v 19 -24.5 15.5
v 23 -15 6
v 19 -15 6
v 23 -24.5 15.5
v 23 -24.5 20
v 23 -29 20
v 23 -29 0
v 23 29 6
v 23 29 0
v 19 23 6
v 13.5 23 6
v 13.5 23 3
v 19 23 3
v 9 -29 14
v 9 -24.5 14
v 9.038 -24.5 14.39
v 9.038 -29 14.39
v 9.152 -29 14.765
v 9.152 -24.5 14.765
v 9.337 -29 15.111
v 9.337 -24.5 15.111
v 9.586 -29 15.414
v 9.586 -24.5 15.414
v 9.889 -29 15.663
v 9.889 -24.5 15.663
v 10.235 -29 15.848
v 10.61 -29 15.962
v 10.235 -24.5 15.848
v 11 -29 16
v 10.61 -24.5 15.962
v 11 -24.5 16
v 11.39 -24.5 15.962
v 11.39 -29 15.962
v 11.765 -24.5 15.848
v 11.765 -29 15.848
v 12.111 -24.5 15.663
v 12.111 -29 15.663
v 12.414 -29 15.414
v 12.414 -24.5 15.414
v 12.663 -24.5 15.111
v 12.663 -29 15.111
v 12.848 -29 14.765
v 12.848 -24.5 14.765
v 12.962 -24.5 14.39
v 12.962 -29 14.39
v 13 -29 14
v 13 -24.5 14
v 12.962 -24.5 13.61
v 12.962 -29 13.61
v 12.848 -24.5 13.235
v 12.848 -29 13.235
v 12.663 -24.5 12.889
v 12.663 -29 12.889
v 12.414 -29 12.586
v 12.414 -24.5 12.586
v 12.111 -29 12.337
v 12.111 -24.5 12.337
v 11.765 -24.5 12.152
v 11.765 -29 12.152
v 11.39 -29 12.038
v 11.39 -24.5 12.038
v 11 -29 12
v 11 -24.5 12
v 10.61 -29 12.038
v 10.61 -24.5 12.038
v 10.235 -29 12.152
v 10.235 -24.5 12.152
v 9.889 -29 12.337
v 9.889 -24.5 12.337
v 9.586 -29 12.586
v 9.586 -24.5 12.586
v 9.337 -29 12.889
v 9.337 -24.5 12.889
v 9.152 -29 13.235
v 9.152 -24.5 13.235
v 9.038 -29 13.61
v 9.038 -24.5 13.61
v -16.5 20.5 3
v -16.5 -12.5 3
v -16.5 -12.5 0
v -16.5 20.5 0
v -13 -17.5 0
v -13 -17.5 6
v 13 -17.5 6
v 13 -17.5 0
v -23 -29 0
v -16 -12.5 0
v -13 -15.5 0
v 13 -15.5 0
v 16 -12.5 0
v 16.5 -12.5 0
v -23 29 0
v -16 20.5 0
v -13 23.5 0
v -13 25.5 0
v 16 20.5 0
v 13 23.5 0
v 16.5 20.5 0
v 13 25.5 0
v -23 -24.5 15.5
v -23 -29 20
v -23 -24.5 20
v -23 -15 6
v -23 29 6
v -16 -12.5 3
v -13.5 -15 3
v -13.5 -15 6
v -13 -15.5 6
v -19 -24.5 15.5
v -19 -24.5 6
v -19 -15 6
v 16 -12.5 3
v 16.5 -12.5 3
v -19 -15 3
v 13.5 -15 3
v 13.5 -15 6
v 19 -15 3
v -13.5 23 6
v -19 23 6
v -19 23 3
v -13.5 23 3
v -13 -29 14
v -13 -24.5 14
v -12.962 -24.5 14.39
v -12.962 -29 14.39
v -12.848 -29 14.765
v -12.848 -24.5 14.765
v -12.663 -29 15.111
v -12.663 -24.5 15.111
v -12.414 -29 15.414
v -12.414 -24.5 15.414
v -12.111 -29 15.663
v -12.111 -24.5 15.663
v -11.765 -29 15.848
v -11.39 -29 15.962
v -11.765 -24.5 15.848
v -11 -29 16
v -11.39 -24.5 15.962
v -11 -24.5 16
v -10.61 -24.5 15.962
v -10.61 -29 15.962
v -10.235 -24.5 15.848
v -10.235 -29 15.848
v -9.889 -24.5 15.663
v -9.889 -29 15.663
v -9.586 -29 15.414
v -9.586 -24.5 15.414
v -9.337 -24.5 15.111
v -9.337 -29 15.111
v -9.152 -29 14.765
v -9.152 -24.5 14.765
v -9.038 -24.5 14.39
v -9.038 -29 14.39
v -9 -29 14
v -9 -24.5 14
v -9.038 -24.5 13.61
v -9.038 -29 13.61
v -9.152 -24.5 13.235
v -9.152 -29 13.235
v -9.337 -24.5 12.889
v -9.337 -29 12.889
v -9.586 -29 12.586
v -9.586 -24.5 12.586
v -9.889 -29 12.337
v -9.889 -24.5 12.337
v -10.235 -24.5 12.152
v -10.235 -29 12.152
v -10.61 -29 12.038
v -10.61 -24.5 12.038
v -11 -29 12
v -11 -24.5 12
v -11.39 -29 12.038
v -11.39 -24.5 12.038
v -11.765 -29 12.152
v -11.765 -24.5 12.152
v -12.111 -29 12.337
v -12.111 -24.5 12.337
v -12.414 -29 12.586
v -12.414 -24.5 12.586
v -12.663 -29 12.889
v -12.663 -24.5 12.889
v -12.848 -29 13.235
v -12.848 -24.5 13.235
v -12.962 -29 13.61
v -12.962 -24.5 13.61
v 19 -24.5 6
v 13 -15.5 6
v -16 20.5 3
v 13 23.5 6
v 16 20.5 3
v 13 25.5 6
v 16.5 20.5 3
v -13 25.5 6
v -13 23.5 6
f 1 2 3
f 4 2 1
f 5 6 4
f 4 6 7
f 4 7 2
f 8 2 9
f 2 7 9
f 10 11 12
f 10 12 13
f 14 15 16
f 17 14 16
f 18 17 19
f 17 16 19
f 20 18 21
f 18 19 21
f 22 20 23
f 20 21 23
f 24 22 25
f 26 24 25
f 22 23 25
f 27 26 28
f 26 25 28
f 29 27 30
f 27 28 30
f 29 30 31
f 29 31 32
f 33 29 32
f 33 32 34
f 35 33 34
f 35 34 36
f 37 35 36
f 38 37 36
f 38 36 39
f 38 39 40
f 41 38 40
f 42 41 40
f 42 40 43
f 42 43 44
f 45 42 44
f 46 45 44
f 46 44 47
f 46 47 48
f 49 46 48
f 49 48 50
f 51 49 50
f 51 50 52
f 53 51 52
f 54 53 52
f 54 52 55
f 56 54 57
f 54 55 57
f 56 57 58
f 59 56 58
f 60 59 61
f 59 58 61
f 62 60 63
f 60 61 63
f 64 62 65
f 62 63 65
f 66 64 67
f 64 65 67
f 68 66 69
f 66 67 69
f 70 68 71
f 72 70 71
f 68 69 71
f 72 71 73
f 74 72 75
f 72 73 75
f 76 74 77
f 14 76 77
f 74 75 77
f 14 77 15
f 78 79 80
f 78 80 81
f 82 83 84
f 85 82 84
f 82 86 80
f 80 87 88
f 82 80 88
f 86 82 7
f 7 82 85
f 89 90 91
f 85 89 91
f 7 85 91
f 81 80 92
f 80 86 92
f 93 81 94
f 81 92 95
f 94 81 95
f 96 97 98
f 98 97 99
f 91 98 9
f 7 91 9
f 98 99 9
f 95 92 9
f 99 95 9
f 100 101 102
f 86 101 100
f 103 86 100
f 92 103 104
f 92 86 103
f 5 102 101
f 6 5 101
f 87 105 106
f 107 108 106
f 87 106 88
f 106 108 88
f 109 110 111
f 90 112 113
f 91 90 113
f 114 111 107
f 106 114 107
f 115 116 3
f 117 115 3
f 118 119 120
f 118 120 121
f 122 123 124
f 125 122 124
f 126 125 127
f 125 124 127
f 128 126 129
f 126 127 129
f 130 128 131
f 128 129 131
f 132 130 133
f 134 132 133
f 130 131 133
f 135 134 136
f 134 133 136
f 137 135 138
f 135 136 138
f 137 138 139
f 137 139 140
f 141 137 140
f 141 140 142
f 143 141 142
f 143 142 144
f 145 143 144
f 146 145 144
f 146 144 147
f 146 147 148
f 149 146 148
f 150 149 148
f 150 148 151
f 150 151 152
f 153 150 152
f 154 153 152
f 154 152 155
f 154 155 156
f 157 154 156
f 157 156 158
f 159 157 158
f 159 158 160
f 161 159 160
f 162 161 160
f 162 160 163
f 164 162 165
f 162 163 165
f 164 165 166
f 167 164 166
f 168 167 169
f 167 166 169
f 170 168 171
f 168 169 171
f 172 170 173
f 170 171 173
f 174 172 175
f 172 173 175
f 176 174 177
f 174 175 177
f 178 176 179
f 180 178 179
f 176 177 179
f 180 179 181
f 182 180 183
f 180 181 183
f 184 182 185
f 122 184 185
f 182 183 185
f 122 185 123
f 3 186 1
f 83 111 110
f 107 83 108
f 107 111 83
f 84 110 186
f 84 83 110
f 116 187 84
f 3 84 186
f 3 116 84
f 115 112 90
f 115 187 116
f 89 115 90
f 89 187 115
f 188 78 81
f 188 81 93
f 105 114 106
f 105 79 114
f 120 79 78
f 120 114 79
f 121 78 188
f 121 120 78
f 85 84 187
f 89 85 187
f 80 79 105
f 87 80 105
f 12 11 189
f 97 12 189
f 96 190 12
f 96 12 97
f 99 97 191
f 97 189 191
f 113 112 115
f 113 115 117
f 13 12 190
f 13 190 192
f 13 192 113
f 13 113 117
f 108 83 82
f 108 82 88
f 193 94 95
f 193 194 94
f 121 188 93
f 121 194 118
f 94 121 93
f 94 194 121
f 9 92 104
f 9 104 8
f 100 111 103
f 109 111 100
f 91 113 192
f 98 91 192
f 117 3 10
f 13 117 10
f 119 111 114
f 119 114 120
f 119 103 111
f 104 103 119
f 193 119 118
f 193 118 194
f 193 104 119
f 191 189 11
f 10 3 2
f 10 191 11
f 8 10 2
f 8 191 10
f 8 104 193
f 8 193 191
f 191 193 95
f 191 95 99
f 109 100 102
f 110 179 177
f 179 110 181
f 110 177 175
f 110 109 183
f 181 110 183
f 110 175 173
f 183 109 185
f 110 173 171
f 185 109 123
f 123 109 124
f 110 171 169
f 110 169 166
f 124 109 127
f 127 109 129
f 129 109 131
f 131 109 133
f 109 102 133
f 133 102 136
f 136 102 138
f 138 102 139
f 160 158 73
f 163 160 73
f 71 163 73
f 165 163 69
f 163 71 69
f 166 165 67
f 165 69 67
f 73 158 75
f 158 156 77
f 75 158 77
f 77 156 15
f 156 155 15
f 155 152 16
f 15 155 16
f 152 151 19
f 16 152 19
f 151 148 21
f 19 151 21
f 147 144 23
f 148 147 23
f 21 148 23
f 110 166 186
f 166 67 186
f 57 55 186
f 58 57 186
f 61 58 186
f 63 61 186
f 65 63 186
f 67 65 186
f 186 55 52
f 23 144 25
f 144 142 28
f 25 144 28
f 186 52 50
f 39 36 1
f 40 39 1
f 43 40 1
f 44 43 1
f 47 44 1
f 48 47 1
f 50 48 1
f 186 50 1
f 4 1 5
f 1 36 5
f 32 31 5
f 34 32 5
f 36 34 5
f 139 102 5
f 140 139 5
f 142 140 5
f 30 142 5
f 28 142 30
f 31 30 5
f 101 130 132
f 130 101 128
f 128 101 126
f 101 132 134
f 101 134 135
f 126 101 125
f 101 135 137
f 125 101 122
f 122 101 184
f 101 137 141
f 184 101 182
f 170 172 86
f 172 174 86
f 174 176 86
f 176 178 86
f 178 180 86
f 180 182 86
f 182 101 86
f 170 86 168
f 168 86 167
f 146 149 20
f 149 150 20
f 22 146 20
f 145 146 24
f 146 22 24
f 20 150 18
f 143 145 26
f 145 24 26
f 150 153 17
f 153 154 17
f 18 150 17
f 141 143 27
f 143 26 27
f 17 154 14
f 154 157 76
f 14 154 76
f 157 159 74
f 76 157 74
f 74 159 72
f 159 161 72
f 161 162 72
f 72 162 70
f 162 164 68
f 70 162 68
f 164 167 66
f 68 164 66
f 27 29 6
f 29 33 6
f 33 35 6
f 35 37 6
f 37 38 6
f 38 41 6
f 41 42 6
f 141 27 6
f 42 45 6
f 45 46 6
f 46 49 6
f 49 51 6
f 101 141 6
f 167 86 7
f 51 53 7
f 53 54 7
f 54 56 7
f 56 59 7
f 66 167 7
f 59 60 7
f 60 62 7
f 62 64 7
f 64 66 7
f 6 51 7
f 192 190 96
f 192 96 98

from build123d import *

# Parameters (mm, degrees)
F0_W          = 46
F0_H          = 58
F1_DEPTH      = 6
F2_W          = 38
F2_H          = 38
F3_DEPTH      = 3
F4_W          = 33
F4_H          = 33
F5_DEPTH      = 3.001
F6_W          = 26
F6_H          = 5
F7_DEPTH      = 3.001
F7_DEPTH_BACK = 3.001
F8_W          = 26
F8_H          = 5
F9_DEPTH      = 3.001
F9_DEPTH_BACK = 3.001
F10_SIZE      = 3
F11_W         = 4.5
F11_H         = 20
F12_DEPTH     = 46
F13_W         = 4
F13_H         = 9.5
F14_DEPTH     = 10
F15_T4_DEPTH  = 4
F16_W         = 4
F16_H         = 9.5
F17_DEPTH     = 10
F18_T4_DEPTH  = 4
F19_R         = 2
F20_DEPTH     = 4.501


# Not quite as in the source:
# - a fillet or chamfer that OpenCascade refuses, or shapes differently, is made with other operations: its cross-section is extruded or revolved along the edge and cut away or added


with BuildPart() as f1:
    # F0 (on Top) → F1 (new body)
    with BuildSketch(Plane.XY):
        Rectangle(F0_W, F0_H)
    extrude(amount=F1_DEPTH)

    # F2 (on face) → F3 (cut)
    with BuildSketch(Plane.XY.offset(6)):
        with Locations((0, 4)):
            Rectangle(F2_W, F2_H)
    extrude(amount=-F3_DEPTH, mode=Mode.SUBTRACT)

    # F4 (on face) → F5 (cut, through all)
    with BuildSketch(Plane.XY.offset(3)):
        with Locations((0, 4)):
            Rectangle(F4_W, F4_H)
    extrude(amount=-F5_DEPTH, mode=Mode.SUBTRACT)

    # F6 (on face) → F7 (cut, two sides)
    with BuildSketch(Plane.XY.offset(3)) as f7_sk:
        with Locations((0, 23)):
            Rectangle(F6_W, F6_H)
    extrude(amount=-F7_DEPTH, mode=Mode.SUBTRACT)
    extrude(f7_sk.sketch, amount=F7_DEPTH_BACK, mode=Mode.SUBTRACT)

    # F8 (on face) → F9 (cut, two sides)
    with BuildSketch(Plane.XY.offset(3)) as f9_sk:
        with Locations((0, -15)):
            Rectangle(F8_W, F8_H)
    extrude(amount=F9_DEPTH, mode=Mode.SUBTRACT)
    extrude(f9_sk.sketch, amount=-F9_DEPTH_BACK, mode=Mode.SUBTRACT)

    # F10
    f10_edges = [f1.edges().sort_by_distance(p)[0] for p in [
        (-13, -12.5, 1.5),
        (-13, 20.5, 1.5),
        (13, 20.5, 1.5),
        (13, -12.5, 1.5),
    ]]
    chamfer(f10_edges, length=F10_SIZE)

    # F11 (on face) → F12 (join)
    with BuildSketch(Plane(origin=(-23, 0, 0), x_dir=(0, -1, 0), z_dir=(-1, 0, 0))):
        with Locations((26.75, 10)):
            Rectangle(F11_W, F11_H)
    extrude(amount=-F12_DEPTH)

    # F13 (on face) → F14 (join)
    with BuildSketch(Plane.XY.offset(6)):
        with Locations((-21, -19.75)):
            Rectangle(F13_W, F13_H)
    extrude(amount=F14_DEPTH)

    # F15: chamfer of 10 on 1 edges, made by hand


with BuildPart() as f15_tool2:
    # F15_s3 → F15_t4 (new body)
    with BuildSketch(Plane.YZ.offset(-19)):
        with BuildLine():
            Line((-14.7171572875, 5.7171572875), (-25.2828427125, 16.2828427125))
            Line((-25.2828427125, 16.2828427125), (-25.2828427125, 16.4828427125))
            ThreePointArc((-25.2828427125, 16.4828427125), (-20.1414213562, 16.2), (-15, 16.2))
            Line((-15, 16.2), (-14.8, 16))
            ThreePointArc((-14.8, 16), (-14.8, 10.8585786438), (-14.5171572875, 5.7171572875))
            Line((-14.5171572875, 5.7171572875), (-14.7171572875, 5.7171572875))
        make_face()
    extrude(amount=-F15_T4_DEPTH)

    split(bisect_by=Plane.XY.offset(6), keep=Keep.TOP)

    split(bisect_by=Plane.XZ.offset(24.5), keep=Keep.BOTTOM)


with BuildPart() as f1_1:
    add(f1.part)

    # F15_t1: cut F15_tool2
    add(f15_tool2.part, mode=Mode.SUBTRACT)

    # F16 (on face) → F17 (join)
    with BuildSketch(Plane.XY.offset(6)):
        with Locations((21, -19.75)):
            Rectangle(F16_W, F16_H)
    extrude(amount=F17_DEPTH)

    # F18: chamfer of 10 on 1 edges, made by hand


with BuildPart() as f18_tool2:
    # F18_s3 → F18_t4 (new body)
    with BuildSketch(Plane.YZ.offset(23)):
        with BuildLine():
            Line((-14.7171572875, 5.7171572875), (-25.2828427125, 16.2828427125))
            Line((-25.2828427125, 16.2828427125), (-25.2828427125, 16.4828427125))
            ThreePointArc((-25.2828427125, 16.4828427125), (-20.1414213562, 16.2), (-15, 16.2))
            Line((-15, 16.2), (-14.8, 16))
            ThreePointArc((-14.8, 16), (-14.8, 10.8585786438), (-14.5171572875, 5.7171572875))
            Line((-14.5171572875, 5.7171572875), (-14.7171572875, 5.7171572875))
        make_face()
    extrude(amount=-F18_T4_DEPTH)

    split(bisect_by=Plane.XY.offset(6), keep=Keep.TOP)

    split(bisect_by=Plane.XZ.offset(24.5), keep=Keep.BOTTOM)


with BuildPart() as f1_2:
    add(f1_1.part)

    # F18_t1: cut F18_tool2
    add(f18_tool2.part, mode=Mode.SUBTRACT)

    # F19 (on face) → F20 (cut, through all)
    with BuildSketch(Plane(origin=(0, -24.5, 0), x_dir=(-1, 0, 0), z_dir=(0, 1, 0))):
        with Locations((11, 14)):
            Circle(F19_R)
        with Locations((-11, 14)):
            Circle(F19_R)
    extrude(amount=-F20_DEPTH, mode=Mode.SUBTRACT)


solid = f1_2.part
